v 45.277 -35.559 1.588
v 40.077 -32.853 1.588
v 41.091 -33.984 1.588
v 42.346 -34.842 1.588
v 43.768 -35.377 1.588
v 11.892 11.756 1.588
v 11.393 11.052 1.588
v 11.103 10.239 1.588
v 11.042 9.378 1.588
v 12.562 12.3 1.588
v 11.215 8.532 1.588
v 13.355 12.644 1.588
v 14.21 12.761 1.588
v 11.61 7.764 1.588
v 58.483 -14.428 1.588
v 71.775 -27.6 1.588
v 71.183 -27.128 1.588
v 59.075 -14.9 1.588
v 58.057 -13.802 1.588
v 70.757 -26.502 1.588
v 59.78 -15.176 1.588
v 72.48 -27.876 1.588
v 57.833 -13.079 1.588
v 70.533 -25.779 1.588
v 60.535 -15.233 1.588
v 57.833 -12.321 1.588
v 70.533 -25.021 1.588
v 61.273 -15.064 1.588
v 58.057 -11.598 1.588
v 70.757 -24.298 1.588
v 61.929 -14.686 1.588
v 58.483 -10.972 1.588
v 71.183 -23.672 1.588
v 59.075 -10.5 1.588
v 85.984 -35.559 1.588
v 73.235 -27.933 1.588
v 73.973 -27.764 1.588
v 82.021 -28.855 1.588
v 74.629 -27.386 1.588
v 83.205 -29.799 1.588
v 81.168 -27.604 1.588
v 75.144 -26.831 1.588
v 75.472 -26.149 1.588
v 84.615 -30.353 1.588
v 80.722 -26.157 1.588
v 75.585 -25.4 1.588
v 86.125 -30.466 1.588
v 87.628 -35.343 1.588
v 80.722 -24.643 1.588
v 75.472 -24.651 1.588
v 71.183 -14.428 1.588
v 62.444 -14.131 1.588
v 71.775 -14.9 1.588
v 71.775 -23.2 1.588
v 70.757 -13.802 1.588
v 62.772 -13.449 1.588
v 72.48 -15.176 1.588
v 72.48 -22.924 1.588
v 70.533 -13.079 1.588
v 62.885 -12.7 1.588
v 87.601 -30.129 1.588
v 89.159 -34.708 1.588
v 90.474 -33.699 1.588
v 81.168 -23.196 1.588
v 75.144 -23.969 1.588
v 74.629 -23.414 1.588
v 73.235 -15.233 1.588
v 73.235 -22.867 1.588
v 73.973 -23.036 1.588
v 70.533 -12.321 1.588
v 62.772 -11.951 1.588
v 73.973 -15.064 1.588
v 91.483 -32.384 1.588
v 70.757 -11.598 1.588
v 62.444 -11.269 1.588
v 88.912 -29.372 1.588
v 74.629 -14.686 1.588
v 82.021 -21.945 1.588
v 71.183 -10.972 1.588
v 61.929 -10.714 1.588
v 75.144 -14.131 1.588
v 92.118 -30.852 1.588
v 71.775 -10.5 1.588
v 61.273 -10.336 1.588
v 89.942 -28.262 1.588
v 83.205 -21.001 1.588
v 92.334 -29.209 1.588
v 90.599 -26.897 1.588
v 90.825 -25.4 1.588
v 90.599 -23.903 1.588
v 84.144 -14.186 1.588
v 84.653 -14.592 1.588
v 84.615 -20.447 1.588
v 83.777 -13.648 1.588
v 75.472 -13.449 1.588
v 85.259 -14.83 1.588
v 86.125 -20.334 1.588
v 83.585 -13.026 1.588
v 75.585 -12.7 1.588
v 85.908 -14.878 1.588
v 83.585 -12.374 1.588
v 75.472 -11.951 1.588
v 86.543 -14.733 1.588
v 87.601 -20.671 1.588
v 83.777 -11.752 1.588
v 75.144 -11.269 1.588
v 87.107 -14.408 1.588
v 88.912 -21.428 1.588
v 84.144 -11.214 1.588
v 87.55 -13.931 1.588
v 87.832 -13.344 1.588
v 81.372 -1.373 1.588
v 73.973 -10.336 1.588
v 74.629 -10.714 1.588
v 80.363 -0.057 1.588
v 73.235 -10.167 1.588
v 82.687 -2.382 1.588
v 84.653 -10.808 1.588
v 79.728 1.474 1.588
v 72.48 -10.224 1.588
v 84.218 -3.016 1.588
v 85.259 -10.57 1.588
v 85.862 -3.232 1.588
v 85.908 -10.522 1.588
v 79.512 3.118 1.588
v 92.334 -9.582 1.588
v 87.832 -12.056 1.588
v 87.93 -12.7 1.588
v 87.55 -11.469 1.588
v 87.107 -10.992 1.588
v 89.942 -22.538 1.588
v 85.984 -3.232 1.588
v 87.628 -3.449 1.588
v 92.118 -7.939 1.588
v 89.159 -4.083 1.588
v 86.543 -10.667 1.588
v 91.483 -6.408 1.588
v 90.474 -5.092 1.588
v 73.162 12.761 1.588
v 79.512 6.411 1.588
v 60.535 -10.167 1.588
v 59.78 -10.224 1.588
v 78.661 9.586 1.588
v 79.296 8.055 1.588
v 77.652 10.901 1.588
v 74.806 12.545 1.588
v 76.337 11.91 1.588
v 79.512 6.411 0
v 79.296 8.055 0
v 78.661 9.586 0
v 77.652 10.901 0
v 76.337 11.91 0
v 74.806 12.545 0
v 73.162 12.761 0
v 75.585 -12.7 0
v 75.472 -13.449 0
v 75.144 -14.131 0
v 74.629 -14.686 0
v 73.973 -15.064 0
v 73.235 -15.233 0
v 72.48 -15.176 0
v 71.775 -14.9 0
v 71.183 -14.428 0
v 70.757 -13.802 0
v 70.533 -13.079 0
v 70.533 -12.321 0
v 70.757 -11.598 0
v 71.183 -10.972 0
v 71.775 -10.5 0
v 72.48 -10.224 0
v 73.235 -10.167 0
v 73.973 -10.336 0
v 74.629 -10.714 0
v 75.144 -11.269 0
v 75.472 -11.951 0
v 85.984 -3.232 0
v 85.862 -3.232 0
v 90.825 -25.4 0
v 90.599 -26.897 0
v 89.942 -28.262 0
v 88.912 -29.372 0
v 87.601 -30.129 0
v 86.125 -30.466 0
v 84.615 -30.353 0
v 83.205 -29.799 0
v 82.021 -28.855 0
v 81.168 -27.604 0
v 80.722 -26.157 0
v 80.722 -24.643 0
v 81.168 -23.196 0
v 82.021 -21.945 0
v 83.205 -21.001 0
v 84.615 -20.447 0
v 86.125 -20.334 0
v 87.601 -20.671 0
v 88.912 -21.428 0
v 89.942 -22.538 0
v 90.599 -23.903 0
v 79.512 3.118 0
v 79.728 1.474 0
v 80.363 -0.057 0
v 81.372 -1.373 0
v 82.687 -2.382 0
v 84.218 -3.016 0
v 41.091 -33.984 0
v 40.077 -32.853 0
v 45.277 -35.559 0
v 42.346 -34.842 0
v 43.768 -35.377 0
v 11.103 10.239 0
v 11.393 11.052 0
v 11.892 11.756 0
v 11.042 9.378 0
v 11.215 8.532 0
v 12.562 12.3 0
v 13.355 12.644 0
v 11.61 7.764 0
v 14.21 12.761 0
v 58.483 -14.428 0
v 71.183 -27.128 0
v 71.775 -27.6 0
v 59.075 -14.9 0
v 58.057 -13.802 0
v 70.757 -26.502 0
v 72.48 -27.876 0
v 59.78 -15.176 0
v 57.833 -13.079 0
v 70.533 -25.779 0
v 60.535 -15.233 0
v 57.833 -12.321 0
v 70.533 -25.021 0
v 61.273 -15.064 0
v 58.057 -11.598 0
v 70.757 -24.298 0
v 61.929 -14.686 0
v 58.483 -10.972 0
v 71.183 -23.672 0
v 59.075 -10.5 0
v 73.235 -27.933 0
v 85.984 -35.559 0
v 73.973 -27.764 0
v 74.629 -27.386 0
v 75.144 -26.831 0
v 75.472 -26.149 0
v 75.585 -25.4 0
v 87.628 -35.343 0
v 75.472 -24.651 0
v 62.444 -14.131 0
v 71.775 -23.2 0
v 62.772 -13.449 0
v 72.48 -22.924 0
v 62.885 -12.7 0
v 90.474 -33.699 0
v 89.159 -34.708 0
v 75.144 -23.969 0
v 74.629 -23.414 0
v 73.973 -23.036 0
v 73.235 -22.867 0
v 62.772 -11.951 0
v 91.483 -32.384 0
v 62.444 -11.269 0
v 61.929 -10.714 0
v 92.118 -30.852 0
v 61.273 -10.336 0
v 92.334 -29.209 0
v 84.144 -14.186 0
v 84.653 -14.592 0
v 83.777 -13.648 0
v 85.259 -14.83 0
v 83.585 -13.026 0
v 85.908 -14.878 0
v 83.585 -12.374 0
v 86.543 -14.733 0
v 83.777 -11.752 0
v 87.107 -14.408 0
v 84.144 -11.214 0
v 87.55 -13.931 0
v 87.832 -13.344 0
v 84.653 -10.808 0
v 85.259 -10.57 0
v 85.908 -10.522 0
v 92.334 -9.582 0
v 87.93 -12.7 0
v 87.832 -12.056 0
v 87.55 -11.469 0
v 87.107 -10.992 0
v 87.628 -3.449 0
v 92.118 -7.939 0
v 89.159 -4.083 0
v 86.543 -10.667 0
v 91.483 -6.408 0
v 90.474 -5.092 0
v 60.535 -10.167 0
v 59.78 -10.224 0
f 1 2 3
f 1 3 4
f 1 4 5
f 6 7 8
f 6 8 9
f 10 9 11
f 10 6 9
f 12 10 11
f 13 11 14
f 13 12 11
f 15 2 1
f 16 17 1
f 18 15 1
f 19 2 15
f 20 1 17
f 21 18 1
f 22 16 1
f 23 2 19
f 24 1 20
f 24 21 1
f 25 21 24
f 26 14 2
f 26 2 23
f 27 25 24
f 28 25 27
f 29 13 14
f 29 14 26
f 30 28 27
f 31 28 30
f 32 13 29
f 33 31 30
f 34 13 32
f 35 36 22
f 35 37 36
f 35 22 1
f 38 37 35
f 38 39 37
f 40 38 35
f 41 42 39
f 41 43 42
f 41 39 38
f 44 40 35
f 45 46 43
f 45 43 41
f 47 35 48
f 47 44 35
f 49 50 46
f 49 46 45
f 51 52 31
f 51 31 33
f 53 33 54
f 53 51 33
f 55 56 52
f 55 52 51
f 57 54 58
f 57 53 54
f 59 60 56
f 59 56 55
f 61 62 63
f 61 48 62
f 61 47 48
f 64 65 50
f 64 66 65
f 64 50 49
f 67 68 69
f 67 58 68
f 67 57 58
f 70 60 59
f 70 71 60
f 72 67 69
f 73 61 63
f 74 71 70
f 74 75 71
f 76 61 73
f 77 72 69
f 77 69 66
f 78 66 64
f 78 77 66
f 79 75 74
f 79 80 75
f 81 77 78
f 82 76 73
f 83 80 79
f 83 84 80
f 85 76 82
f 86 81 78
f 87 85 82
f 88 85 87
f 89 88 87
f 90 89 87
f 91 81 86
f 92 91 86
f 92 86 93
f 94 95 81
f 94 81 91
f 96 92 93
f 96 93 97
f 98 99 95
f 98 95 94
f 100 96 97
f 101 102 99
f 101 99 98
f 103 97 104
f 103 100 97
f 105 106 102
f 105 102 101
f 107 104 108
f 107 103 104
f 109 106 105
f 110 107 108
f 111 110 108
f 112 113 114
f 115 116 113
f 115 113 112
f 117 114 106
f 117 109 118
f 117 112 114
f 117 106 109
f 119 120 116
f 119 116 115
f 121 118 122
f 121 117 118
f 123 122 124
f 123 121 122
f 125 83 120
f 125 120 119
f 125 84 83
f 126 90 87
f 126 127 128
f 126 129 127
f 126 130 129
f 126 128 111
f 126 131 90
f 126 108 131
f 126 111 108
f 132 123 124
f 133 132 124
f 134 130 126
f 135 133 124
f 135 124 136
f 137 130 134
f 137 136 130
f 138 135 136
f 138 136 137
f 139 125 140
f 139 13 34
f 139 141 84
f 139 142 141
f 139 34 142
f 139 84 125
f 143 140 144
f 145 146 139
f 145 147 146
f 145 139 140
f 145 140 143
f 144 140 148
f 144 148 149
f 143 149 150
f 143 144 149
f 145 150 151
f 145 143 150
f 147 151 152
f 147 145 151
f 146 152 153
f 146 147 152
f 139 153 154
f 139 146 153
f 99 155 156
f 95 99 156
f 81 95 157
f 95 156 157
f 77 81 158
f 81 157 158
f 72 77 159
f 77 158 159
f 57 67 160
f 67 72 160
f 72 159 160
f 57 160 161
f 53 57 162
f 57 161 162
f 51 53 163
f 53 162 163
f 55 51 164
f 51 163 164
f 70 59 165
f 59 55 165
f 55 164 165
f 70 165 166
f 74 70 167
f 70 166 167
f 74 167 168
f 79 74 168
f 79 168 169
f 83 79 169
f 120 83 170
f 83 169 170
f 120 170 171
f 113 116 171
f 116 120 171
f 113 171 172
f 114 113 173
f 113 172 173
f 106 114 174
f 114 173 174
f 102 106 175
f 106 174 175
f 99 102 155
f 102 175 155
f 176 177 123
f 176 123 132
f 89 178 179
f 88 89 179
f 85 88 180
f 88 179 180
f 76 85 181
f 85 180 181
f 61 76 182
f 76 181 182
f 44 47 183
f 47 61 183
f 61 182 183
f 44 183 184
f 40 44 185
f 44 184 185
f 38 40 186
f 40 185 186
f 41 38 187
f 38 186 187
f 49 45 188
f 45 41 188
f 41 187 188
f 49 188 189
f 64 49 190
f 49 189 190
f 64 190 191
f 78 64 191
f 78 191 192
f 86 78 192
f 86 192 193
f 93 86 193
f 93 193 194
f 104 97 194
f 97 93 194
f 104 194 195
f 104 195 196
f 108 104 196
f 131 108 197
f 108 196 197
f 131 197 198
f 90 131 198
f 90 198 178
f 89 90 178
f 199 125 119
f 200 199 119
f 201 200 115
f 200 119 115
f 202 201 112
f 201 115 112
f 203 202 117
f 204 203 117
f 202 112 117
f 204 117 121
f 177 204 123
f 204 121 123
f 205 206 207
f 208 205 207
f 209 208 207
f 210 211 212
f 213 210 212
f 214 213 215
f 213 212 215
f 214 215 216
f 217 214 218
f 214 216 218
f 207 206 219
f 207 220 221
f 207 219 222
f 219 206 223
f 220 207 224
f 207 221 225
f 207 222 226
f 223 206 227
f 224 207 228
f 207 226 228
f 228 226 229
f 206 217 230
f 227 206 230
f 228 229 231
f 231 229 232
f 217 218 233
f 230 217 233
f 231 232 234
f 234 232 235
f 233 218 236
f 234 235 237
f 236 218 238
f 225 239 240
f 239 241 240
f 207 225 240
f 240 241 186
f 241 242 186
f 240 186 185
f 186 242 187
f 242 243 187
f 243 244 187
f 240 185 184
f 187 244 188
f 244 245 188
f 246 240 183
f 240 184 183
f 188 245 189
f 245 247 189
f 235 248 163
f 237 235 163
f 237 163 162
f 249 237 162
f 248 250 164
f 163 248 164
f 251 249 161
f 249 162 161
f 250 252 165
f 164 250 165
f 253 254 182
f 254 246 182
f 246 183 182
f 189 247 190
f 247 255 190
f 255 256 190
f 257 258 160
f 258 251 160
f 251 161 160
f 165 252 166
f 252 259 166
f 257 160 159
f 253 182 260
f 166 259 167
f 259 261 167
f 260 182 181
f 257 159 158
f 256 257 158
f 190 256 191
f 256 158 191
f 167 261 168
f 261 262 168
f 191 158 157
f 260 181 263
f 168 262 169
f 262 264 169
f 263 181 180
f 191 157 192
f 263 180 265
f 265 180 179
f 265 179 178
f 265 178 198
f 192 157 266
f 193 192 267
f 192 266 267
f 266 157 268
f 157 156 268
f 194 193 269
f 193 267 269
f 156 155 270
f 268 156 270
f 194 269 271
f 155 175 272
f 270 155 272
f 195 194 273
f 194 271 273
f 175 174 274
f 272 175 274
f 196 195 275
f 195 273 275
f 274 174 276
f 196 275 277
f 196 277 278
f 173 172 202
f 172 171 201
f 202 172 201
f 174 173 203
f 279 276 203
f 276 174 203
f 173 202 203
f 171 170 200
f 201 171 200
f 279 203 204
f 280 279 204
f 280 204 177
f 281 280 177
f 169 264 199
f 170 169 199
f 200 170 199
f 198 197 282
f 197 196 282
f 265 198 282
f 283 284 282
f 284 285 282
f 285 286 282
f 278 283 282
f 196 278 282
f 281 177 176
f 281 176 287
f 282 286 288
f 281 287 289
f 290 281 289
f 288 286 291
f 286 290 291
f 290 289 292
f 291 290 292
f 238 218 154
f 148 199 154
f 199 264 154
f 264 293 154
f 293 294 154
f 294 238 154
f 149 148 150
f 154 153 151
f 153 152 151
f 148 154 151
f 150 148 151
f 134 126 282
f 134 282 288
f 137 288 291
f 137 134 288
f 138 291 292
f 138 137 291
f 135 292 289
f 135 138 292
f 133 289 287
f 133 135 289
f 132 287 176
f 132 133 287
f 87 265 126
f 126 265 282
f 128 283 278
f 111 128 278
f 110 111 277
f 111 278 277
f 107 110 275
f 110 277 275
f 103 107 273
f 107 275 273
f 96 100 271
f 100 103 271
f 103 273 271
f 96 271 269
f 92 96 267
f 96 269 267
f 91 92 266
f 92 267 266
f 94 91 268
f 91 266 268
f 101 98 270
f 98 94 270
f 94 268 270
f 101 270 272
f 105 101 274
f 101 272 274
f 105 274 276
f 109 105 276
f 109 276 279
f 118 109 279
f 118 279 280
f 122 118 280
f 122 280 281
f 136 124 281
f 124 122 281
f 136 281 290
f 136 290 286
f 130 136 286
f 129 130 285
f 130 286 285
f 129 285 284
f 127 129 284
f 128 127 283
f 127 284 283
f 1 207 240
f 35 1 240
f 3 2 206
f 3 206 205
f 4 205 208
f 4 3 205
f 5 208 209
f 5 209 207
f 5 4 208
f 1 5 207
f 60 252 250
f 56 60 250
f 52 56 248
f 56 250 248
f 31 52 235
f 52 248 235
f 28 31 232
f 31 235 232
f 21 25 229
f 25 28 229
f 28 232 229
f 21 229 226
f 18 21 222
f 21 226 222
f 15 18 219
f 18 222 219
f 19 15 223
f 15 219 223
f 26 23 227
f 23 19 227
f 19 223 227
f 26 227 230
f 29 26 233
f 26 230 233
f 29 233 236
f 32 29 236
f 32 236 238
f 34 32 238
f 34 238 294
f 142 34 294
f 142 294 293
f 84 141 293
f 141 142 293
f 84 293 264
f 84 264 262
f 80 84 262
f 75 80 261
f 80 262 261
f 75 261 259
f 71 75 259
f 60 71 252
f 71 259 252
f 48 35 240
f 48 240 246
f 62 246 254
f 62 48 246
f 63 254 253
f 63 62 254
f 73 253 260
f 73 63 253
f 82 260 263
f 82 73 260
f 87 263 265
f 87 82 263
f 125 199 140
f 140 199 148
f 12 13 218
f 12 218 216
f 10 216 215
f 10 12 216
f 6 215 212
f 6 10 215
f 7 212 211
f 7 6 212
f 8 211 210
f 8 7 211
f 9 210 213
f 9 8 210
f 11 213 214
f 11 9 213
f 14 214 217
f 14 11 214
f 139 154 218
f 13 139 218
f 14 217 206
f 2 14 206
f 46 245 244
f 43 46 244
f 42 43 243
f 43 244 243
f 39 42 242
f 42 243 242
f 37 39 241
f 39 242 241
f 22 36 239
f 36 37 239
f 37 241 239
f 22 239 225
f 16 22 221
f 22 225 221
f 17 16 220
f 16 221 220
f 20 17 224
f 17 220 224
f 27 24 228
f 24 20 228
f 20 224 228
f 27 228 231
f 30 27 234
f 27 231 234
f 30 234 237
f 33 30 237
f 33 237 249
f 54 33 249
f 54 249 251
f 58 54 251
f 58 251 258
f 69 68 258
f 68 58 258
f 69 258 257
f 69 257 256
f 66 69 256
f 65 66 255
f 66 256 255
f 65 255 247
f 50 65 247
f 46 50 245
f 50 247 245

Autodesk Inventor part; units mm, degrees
ref_plane "YZ Plane" through (0, 0, 0) normal (1, 0, 0) x (0, 1, 0)
ref_plane "XZ Plane" through (0, 0, 0) normal (0, 1, 0) x (-1, 0, 0)
ref_plane "XY Plane" through (0, 0, 0) normal (0, 0, 1) x (1, 0, 0)
sketch "Sketch1" plane through (0, 0, 0) normal (0, 0, 1) x (1, 0, 0)
  line L0 (47.6451, -34.29) -> (92.334, -34.29)
  line L1 (47.6451, -34.29) -> (41.1035, -34.29)
  line L2 (39.8575, 12.7612) -> (31.599, 12.7612)
  line L3 (39.8575, 12.7612) -> (20.8075, 12.7612)
  line L4 (79.512, 12.7612) -> (37.4294, 12.7612)
  line L5 (79.512, -31.9773) -> (79.512, 12.7612)
  line L6 (92.334, -18.8499) -> (92.334, 1.5256)
  line L7 (92.334, -18.8499) -> (92.334, -34.29)
  circle A0 centre (85.7451, -25.4) radius 3.9624
  circle A1 centre (85.7451, -12.7) radius 2.1844
  circle A2 centre (73.0451, -12.7) radius 2.54
  circle A3 centre (60.3451, -12.7) radius 2.54
  circle A4 centre (73.0451, -25.4) radius 2.54
  line L8 (-341.1851, -3.2325) -> (91.1147, -3.2325)
  line L9 (25.7365, 2.0147) -> (20.8075, 12.7612)
  line L10 (91.1147, -3.2325) -> (92.334, -3.2325)
  circle A5 centre (85.7451, -25.4) radius 5.08
  line L11 (39.8575, 12.7612) -> (8.1075, 12.7612)
  line L12 (8.1075, 12.7612) -> (56.4583, -56.2272)
  line L13 (41.1035, -35.5589) -> (41.9728, -35.5589)
  line L14 (41.9728, -35.5589) -> (92.334, -35.5589)
  line L15 (92.334, -35.5589) -> (92.334, -34.29)
  point P0 (0, 0)
  point P1 (0, 0)
  point P2 (41.3274, -31.9773)
  point P3 (79.512, -18.8499)
  point P4 (79.512, -3.2325)
  point P5 (79.512, -3.2325)
  dimension "d0" = 19.05
  dimension "d1" = 432.2999
  dimension "d2" = 10.16
  dimension "d3" = 31.75
extrude "Extrusion1" add sketch "Sketch1" along normal blind 1.5875 contours L4 L5 L8 L12 L11 L3 L2 | L8 L10 L6 L7 L15 L14 L12
fillet "Fillet1" radius 6.35 5 edges at (79.512, 12.7612, 0.7937) (79.512, -3.2325, 0.7937) (92.334, -3.2325, 0.7937) (92.334, -35.5589, 0.7937) (41.9728, -35.5589, 0.7937)
fillet "Fillet2" radius 3.175 1 edges at (8.1075, 12.7612, 0.7937)
properties part number "Sleds poly V4"
